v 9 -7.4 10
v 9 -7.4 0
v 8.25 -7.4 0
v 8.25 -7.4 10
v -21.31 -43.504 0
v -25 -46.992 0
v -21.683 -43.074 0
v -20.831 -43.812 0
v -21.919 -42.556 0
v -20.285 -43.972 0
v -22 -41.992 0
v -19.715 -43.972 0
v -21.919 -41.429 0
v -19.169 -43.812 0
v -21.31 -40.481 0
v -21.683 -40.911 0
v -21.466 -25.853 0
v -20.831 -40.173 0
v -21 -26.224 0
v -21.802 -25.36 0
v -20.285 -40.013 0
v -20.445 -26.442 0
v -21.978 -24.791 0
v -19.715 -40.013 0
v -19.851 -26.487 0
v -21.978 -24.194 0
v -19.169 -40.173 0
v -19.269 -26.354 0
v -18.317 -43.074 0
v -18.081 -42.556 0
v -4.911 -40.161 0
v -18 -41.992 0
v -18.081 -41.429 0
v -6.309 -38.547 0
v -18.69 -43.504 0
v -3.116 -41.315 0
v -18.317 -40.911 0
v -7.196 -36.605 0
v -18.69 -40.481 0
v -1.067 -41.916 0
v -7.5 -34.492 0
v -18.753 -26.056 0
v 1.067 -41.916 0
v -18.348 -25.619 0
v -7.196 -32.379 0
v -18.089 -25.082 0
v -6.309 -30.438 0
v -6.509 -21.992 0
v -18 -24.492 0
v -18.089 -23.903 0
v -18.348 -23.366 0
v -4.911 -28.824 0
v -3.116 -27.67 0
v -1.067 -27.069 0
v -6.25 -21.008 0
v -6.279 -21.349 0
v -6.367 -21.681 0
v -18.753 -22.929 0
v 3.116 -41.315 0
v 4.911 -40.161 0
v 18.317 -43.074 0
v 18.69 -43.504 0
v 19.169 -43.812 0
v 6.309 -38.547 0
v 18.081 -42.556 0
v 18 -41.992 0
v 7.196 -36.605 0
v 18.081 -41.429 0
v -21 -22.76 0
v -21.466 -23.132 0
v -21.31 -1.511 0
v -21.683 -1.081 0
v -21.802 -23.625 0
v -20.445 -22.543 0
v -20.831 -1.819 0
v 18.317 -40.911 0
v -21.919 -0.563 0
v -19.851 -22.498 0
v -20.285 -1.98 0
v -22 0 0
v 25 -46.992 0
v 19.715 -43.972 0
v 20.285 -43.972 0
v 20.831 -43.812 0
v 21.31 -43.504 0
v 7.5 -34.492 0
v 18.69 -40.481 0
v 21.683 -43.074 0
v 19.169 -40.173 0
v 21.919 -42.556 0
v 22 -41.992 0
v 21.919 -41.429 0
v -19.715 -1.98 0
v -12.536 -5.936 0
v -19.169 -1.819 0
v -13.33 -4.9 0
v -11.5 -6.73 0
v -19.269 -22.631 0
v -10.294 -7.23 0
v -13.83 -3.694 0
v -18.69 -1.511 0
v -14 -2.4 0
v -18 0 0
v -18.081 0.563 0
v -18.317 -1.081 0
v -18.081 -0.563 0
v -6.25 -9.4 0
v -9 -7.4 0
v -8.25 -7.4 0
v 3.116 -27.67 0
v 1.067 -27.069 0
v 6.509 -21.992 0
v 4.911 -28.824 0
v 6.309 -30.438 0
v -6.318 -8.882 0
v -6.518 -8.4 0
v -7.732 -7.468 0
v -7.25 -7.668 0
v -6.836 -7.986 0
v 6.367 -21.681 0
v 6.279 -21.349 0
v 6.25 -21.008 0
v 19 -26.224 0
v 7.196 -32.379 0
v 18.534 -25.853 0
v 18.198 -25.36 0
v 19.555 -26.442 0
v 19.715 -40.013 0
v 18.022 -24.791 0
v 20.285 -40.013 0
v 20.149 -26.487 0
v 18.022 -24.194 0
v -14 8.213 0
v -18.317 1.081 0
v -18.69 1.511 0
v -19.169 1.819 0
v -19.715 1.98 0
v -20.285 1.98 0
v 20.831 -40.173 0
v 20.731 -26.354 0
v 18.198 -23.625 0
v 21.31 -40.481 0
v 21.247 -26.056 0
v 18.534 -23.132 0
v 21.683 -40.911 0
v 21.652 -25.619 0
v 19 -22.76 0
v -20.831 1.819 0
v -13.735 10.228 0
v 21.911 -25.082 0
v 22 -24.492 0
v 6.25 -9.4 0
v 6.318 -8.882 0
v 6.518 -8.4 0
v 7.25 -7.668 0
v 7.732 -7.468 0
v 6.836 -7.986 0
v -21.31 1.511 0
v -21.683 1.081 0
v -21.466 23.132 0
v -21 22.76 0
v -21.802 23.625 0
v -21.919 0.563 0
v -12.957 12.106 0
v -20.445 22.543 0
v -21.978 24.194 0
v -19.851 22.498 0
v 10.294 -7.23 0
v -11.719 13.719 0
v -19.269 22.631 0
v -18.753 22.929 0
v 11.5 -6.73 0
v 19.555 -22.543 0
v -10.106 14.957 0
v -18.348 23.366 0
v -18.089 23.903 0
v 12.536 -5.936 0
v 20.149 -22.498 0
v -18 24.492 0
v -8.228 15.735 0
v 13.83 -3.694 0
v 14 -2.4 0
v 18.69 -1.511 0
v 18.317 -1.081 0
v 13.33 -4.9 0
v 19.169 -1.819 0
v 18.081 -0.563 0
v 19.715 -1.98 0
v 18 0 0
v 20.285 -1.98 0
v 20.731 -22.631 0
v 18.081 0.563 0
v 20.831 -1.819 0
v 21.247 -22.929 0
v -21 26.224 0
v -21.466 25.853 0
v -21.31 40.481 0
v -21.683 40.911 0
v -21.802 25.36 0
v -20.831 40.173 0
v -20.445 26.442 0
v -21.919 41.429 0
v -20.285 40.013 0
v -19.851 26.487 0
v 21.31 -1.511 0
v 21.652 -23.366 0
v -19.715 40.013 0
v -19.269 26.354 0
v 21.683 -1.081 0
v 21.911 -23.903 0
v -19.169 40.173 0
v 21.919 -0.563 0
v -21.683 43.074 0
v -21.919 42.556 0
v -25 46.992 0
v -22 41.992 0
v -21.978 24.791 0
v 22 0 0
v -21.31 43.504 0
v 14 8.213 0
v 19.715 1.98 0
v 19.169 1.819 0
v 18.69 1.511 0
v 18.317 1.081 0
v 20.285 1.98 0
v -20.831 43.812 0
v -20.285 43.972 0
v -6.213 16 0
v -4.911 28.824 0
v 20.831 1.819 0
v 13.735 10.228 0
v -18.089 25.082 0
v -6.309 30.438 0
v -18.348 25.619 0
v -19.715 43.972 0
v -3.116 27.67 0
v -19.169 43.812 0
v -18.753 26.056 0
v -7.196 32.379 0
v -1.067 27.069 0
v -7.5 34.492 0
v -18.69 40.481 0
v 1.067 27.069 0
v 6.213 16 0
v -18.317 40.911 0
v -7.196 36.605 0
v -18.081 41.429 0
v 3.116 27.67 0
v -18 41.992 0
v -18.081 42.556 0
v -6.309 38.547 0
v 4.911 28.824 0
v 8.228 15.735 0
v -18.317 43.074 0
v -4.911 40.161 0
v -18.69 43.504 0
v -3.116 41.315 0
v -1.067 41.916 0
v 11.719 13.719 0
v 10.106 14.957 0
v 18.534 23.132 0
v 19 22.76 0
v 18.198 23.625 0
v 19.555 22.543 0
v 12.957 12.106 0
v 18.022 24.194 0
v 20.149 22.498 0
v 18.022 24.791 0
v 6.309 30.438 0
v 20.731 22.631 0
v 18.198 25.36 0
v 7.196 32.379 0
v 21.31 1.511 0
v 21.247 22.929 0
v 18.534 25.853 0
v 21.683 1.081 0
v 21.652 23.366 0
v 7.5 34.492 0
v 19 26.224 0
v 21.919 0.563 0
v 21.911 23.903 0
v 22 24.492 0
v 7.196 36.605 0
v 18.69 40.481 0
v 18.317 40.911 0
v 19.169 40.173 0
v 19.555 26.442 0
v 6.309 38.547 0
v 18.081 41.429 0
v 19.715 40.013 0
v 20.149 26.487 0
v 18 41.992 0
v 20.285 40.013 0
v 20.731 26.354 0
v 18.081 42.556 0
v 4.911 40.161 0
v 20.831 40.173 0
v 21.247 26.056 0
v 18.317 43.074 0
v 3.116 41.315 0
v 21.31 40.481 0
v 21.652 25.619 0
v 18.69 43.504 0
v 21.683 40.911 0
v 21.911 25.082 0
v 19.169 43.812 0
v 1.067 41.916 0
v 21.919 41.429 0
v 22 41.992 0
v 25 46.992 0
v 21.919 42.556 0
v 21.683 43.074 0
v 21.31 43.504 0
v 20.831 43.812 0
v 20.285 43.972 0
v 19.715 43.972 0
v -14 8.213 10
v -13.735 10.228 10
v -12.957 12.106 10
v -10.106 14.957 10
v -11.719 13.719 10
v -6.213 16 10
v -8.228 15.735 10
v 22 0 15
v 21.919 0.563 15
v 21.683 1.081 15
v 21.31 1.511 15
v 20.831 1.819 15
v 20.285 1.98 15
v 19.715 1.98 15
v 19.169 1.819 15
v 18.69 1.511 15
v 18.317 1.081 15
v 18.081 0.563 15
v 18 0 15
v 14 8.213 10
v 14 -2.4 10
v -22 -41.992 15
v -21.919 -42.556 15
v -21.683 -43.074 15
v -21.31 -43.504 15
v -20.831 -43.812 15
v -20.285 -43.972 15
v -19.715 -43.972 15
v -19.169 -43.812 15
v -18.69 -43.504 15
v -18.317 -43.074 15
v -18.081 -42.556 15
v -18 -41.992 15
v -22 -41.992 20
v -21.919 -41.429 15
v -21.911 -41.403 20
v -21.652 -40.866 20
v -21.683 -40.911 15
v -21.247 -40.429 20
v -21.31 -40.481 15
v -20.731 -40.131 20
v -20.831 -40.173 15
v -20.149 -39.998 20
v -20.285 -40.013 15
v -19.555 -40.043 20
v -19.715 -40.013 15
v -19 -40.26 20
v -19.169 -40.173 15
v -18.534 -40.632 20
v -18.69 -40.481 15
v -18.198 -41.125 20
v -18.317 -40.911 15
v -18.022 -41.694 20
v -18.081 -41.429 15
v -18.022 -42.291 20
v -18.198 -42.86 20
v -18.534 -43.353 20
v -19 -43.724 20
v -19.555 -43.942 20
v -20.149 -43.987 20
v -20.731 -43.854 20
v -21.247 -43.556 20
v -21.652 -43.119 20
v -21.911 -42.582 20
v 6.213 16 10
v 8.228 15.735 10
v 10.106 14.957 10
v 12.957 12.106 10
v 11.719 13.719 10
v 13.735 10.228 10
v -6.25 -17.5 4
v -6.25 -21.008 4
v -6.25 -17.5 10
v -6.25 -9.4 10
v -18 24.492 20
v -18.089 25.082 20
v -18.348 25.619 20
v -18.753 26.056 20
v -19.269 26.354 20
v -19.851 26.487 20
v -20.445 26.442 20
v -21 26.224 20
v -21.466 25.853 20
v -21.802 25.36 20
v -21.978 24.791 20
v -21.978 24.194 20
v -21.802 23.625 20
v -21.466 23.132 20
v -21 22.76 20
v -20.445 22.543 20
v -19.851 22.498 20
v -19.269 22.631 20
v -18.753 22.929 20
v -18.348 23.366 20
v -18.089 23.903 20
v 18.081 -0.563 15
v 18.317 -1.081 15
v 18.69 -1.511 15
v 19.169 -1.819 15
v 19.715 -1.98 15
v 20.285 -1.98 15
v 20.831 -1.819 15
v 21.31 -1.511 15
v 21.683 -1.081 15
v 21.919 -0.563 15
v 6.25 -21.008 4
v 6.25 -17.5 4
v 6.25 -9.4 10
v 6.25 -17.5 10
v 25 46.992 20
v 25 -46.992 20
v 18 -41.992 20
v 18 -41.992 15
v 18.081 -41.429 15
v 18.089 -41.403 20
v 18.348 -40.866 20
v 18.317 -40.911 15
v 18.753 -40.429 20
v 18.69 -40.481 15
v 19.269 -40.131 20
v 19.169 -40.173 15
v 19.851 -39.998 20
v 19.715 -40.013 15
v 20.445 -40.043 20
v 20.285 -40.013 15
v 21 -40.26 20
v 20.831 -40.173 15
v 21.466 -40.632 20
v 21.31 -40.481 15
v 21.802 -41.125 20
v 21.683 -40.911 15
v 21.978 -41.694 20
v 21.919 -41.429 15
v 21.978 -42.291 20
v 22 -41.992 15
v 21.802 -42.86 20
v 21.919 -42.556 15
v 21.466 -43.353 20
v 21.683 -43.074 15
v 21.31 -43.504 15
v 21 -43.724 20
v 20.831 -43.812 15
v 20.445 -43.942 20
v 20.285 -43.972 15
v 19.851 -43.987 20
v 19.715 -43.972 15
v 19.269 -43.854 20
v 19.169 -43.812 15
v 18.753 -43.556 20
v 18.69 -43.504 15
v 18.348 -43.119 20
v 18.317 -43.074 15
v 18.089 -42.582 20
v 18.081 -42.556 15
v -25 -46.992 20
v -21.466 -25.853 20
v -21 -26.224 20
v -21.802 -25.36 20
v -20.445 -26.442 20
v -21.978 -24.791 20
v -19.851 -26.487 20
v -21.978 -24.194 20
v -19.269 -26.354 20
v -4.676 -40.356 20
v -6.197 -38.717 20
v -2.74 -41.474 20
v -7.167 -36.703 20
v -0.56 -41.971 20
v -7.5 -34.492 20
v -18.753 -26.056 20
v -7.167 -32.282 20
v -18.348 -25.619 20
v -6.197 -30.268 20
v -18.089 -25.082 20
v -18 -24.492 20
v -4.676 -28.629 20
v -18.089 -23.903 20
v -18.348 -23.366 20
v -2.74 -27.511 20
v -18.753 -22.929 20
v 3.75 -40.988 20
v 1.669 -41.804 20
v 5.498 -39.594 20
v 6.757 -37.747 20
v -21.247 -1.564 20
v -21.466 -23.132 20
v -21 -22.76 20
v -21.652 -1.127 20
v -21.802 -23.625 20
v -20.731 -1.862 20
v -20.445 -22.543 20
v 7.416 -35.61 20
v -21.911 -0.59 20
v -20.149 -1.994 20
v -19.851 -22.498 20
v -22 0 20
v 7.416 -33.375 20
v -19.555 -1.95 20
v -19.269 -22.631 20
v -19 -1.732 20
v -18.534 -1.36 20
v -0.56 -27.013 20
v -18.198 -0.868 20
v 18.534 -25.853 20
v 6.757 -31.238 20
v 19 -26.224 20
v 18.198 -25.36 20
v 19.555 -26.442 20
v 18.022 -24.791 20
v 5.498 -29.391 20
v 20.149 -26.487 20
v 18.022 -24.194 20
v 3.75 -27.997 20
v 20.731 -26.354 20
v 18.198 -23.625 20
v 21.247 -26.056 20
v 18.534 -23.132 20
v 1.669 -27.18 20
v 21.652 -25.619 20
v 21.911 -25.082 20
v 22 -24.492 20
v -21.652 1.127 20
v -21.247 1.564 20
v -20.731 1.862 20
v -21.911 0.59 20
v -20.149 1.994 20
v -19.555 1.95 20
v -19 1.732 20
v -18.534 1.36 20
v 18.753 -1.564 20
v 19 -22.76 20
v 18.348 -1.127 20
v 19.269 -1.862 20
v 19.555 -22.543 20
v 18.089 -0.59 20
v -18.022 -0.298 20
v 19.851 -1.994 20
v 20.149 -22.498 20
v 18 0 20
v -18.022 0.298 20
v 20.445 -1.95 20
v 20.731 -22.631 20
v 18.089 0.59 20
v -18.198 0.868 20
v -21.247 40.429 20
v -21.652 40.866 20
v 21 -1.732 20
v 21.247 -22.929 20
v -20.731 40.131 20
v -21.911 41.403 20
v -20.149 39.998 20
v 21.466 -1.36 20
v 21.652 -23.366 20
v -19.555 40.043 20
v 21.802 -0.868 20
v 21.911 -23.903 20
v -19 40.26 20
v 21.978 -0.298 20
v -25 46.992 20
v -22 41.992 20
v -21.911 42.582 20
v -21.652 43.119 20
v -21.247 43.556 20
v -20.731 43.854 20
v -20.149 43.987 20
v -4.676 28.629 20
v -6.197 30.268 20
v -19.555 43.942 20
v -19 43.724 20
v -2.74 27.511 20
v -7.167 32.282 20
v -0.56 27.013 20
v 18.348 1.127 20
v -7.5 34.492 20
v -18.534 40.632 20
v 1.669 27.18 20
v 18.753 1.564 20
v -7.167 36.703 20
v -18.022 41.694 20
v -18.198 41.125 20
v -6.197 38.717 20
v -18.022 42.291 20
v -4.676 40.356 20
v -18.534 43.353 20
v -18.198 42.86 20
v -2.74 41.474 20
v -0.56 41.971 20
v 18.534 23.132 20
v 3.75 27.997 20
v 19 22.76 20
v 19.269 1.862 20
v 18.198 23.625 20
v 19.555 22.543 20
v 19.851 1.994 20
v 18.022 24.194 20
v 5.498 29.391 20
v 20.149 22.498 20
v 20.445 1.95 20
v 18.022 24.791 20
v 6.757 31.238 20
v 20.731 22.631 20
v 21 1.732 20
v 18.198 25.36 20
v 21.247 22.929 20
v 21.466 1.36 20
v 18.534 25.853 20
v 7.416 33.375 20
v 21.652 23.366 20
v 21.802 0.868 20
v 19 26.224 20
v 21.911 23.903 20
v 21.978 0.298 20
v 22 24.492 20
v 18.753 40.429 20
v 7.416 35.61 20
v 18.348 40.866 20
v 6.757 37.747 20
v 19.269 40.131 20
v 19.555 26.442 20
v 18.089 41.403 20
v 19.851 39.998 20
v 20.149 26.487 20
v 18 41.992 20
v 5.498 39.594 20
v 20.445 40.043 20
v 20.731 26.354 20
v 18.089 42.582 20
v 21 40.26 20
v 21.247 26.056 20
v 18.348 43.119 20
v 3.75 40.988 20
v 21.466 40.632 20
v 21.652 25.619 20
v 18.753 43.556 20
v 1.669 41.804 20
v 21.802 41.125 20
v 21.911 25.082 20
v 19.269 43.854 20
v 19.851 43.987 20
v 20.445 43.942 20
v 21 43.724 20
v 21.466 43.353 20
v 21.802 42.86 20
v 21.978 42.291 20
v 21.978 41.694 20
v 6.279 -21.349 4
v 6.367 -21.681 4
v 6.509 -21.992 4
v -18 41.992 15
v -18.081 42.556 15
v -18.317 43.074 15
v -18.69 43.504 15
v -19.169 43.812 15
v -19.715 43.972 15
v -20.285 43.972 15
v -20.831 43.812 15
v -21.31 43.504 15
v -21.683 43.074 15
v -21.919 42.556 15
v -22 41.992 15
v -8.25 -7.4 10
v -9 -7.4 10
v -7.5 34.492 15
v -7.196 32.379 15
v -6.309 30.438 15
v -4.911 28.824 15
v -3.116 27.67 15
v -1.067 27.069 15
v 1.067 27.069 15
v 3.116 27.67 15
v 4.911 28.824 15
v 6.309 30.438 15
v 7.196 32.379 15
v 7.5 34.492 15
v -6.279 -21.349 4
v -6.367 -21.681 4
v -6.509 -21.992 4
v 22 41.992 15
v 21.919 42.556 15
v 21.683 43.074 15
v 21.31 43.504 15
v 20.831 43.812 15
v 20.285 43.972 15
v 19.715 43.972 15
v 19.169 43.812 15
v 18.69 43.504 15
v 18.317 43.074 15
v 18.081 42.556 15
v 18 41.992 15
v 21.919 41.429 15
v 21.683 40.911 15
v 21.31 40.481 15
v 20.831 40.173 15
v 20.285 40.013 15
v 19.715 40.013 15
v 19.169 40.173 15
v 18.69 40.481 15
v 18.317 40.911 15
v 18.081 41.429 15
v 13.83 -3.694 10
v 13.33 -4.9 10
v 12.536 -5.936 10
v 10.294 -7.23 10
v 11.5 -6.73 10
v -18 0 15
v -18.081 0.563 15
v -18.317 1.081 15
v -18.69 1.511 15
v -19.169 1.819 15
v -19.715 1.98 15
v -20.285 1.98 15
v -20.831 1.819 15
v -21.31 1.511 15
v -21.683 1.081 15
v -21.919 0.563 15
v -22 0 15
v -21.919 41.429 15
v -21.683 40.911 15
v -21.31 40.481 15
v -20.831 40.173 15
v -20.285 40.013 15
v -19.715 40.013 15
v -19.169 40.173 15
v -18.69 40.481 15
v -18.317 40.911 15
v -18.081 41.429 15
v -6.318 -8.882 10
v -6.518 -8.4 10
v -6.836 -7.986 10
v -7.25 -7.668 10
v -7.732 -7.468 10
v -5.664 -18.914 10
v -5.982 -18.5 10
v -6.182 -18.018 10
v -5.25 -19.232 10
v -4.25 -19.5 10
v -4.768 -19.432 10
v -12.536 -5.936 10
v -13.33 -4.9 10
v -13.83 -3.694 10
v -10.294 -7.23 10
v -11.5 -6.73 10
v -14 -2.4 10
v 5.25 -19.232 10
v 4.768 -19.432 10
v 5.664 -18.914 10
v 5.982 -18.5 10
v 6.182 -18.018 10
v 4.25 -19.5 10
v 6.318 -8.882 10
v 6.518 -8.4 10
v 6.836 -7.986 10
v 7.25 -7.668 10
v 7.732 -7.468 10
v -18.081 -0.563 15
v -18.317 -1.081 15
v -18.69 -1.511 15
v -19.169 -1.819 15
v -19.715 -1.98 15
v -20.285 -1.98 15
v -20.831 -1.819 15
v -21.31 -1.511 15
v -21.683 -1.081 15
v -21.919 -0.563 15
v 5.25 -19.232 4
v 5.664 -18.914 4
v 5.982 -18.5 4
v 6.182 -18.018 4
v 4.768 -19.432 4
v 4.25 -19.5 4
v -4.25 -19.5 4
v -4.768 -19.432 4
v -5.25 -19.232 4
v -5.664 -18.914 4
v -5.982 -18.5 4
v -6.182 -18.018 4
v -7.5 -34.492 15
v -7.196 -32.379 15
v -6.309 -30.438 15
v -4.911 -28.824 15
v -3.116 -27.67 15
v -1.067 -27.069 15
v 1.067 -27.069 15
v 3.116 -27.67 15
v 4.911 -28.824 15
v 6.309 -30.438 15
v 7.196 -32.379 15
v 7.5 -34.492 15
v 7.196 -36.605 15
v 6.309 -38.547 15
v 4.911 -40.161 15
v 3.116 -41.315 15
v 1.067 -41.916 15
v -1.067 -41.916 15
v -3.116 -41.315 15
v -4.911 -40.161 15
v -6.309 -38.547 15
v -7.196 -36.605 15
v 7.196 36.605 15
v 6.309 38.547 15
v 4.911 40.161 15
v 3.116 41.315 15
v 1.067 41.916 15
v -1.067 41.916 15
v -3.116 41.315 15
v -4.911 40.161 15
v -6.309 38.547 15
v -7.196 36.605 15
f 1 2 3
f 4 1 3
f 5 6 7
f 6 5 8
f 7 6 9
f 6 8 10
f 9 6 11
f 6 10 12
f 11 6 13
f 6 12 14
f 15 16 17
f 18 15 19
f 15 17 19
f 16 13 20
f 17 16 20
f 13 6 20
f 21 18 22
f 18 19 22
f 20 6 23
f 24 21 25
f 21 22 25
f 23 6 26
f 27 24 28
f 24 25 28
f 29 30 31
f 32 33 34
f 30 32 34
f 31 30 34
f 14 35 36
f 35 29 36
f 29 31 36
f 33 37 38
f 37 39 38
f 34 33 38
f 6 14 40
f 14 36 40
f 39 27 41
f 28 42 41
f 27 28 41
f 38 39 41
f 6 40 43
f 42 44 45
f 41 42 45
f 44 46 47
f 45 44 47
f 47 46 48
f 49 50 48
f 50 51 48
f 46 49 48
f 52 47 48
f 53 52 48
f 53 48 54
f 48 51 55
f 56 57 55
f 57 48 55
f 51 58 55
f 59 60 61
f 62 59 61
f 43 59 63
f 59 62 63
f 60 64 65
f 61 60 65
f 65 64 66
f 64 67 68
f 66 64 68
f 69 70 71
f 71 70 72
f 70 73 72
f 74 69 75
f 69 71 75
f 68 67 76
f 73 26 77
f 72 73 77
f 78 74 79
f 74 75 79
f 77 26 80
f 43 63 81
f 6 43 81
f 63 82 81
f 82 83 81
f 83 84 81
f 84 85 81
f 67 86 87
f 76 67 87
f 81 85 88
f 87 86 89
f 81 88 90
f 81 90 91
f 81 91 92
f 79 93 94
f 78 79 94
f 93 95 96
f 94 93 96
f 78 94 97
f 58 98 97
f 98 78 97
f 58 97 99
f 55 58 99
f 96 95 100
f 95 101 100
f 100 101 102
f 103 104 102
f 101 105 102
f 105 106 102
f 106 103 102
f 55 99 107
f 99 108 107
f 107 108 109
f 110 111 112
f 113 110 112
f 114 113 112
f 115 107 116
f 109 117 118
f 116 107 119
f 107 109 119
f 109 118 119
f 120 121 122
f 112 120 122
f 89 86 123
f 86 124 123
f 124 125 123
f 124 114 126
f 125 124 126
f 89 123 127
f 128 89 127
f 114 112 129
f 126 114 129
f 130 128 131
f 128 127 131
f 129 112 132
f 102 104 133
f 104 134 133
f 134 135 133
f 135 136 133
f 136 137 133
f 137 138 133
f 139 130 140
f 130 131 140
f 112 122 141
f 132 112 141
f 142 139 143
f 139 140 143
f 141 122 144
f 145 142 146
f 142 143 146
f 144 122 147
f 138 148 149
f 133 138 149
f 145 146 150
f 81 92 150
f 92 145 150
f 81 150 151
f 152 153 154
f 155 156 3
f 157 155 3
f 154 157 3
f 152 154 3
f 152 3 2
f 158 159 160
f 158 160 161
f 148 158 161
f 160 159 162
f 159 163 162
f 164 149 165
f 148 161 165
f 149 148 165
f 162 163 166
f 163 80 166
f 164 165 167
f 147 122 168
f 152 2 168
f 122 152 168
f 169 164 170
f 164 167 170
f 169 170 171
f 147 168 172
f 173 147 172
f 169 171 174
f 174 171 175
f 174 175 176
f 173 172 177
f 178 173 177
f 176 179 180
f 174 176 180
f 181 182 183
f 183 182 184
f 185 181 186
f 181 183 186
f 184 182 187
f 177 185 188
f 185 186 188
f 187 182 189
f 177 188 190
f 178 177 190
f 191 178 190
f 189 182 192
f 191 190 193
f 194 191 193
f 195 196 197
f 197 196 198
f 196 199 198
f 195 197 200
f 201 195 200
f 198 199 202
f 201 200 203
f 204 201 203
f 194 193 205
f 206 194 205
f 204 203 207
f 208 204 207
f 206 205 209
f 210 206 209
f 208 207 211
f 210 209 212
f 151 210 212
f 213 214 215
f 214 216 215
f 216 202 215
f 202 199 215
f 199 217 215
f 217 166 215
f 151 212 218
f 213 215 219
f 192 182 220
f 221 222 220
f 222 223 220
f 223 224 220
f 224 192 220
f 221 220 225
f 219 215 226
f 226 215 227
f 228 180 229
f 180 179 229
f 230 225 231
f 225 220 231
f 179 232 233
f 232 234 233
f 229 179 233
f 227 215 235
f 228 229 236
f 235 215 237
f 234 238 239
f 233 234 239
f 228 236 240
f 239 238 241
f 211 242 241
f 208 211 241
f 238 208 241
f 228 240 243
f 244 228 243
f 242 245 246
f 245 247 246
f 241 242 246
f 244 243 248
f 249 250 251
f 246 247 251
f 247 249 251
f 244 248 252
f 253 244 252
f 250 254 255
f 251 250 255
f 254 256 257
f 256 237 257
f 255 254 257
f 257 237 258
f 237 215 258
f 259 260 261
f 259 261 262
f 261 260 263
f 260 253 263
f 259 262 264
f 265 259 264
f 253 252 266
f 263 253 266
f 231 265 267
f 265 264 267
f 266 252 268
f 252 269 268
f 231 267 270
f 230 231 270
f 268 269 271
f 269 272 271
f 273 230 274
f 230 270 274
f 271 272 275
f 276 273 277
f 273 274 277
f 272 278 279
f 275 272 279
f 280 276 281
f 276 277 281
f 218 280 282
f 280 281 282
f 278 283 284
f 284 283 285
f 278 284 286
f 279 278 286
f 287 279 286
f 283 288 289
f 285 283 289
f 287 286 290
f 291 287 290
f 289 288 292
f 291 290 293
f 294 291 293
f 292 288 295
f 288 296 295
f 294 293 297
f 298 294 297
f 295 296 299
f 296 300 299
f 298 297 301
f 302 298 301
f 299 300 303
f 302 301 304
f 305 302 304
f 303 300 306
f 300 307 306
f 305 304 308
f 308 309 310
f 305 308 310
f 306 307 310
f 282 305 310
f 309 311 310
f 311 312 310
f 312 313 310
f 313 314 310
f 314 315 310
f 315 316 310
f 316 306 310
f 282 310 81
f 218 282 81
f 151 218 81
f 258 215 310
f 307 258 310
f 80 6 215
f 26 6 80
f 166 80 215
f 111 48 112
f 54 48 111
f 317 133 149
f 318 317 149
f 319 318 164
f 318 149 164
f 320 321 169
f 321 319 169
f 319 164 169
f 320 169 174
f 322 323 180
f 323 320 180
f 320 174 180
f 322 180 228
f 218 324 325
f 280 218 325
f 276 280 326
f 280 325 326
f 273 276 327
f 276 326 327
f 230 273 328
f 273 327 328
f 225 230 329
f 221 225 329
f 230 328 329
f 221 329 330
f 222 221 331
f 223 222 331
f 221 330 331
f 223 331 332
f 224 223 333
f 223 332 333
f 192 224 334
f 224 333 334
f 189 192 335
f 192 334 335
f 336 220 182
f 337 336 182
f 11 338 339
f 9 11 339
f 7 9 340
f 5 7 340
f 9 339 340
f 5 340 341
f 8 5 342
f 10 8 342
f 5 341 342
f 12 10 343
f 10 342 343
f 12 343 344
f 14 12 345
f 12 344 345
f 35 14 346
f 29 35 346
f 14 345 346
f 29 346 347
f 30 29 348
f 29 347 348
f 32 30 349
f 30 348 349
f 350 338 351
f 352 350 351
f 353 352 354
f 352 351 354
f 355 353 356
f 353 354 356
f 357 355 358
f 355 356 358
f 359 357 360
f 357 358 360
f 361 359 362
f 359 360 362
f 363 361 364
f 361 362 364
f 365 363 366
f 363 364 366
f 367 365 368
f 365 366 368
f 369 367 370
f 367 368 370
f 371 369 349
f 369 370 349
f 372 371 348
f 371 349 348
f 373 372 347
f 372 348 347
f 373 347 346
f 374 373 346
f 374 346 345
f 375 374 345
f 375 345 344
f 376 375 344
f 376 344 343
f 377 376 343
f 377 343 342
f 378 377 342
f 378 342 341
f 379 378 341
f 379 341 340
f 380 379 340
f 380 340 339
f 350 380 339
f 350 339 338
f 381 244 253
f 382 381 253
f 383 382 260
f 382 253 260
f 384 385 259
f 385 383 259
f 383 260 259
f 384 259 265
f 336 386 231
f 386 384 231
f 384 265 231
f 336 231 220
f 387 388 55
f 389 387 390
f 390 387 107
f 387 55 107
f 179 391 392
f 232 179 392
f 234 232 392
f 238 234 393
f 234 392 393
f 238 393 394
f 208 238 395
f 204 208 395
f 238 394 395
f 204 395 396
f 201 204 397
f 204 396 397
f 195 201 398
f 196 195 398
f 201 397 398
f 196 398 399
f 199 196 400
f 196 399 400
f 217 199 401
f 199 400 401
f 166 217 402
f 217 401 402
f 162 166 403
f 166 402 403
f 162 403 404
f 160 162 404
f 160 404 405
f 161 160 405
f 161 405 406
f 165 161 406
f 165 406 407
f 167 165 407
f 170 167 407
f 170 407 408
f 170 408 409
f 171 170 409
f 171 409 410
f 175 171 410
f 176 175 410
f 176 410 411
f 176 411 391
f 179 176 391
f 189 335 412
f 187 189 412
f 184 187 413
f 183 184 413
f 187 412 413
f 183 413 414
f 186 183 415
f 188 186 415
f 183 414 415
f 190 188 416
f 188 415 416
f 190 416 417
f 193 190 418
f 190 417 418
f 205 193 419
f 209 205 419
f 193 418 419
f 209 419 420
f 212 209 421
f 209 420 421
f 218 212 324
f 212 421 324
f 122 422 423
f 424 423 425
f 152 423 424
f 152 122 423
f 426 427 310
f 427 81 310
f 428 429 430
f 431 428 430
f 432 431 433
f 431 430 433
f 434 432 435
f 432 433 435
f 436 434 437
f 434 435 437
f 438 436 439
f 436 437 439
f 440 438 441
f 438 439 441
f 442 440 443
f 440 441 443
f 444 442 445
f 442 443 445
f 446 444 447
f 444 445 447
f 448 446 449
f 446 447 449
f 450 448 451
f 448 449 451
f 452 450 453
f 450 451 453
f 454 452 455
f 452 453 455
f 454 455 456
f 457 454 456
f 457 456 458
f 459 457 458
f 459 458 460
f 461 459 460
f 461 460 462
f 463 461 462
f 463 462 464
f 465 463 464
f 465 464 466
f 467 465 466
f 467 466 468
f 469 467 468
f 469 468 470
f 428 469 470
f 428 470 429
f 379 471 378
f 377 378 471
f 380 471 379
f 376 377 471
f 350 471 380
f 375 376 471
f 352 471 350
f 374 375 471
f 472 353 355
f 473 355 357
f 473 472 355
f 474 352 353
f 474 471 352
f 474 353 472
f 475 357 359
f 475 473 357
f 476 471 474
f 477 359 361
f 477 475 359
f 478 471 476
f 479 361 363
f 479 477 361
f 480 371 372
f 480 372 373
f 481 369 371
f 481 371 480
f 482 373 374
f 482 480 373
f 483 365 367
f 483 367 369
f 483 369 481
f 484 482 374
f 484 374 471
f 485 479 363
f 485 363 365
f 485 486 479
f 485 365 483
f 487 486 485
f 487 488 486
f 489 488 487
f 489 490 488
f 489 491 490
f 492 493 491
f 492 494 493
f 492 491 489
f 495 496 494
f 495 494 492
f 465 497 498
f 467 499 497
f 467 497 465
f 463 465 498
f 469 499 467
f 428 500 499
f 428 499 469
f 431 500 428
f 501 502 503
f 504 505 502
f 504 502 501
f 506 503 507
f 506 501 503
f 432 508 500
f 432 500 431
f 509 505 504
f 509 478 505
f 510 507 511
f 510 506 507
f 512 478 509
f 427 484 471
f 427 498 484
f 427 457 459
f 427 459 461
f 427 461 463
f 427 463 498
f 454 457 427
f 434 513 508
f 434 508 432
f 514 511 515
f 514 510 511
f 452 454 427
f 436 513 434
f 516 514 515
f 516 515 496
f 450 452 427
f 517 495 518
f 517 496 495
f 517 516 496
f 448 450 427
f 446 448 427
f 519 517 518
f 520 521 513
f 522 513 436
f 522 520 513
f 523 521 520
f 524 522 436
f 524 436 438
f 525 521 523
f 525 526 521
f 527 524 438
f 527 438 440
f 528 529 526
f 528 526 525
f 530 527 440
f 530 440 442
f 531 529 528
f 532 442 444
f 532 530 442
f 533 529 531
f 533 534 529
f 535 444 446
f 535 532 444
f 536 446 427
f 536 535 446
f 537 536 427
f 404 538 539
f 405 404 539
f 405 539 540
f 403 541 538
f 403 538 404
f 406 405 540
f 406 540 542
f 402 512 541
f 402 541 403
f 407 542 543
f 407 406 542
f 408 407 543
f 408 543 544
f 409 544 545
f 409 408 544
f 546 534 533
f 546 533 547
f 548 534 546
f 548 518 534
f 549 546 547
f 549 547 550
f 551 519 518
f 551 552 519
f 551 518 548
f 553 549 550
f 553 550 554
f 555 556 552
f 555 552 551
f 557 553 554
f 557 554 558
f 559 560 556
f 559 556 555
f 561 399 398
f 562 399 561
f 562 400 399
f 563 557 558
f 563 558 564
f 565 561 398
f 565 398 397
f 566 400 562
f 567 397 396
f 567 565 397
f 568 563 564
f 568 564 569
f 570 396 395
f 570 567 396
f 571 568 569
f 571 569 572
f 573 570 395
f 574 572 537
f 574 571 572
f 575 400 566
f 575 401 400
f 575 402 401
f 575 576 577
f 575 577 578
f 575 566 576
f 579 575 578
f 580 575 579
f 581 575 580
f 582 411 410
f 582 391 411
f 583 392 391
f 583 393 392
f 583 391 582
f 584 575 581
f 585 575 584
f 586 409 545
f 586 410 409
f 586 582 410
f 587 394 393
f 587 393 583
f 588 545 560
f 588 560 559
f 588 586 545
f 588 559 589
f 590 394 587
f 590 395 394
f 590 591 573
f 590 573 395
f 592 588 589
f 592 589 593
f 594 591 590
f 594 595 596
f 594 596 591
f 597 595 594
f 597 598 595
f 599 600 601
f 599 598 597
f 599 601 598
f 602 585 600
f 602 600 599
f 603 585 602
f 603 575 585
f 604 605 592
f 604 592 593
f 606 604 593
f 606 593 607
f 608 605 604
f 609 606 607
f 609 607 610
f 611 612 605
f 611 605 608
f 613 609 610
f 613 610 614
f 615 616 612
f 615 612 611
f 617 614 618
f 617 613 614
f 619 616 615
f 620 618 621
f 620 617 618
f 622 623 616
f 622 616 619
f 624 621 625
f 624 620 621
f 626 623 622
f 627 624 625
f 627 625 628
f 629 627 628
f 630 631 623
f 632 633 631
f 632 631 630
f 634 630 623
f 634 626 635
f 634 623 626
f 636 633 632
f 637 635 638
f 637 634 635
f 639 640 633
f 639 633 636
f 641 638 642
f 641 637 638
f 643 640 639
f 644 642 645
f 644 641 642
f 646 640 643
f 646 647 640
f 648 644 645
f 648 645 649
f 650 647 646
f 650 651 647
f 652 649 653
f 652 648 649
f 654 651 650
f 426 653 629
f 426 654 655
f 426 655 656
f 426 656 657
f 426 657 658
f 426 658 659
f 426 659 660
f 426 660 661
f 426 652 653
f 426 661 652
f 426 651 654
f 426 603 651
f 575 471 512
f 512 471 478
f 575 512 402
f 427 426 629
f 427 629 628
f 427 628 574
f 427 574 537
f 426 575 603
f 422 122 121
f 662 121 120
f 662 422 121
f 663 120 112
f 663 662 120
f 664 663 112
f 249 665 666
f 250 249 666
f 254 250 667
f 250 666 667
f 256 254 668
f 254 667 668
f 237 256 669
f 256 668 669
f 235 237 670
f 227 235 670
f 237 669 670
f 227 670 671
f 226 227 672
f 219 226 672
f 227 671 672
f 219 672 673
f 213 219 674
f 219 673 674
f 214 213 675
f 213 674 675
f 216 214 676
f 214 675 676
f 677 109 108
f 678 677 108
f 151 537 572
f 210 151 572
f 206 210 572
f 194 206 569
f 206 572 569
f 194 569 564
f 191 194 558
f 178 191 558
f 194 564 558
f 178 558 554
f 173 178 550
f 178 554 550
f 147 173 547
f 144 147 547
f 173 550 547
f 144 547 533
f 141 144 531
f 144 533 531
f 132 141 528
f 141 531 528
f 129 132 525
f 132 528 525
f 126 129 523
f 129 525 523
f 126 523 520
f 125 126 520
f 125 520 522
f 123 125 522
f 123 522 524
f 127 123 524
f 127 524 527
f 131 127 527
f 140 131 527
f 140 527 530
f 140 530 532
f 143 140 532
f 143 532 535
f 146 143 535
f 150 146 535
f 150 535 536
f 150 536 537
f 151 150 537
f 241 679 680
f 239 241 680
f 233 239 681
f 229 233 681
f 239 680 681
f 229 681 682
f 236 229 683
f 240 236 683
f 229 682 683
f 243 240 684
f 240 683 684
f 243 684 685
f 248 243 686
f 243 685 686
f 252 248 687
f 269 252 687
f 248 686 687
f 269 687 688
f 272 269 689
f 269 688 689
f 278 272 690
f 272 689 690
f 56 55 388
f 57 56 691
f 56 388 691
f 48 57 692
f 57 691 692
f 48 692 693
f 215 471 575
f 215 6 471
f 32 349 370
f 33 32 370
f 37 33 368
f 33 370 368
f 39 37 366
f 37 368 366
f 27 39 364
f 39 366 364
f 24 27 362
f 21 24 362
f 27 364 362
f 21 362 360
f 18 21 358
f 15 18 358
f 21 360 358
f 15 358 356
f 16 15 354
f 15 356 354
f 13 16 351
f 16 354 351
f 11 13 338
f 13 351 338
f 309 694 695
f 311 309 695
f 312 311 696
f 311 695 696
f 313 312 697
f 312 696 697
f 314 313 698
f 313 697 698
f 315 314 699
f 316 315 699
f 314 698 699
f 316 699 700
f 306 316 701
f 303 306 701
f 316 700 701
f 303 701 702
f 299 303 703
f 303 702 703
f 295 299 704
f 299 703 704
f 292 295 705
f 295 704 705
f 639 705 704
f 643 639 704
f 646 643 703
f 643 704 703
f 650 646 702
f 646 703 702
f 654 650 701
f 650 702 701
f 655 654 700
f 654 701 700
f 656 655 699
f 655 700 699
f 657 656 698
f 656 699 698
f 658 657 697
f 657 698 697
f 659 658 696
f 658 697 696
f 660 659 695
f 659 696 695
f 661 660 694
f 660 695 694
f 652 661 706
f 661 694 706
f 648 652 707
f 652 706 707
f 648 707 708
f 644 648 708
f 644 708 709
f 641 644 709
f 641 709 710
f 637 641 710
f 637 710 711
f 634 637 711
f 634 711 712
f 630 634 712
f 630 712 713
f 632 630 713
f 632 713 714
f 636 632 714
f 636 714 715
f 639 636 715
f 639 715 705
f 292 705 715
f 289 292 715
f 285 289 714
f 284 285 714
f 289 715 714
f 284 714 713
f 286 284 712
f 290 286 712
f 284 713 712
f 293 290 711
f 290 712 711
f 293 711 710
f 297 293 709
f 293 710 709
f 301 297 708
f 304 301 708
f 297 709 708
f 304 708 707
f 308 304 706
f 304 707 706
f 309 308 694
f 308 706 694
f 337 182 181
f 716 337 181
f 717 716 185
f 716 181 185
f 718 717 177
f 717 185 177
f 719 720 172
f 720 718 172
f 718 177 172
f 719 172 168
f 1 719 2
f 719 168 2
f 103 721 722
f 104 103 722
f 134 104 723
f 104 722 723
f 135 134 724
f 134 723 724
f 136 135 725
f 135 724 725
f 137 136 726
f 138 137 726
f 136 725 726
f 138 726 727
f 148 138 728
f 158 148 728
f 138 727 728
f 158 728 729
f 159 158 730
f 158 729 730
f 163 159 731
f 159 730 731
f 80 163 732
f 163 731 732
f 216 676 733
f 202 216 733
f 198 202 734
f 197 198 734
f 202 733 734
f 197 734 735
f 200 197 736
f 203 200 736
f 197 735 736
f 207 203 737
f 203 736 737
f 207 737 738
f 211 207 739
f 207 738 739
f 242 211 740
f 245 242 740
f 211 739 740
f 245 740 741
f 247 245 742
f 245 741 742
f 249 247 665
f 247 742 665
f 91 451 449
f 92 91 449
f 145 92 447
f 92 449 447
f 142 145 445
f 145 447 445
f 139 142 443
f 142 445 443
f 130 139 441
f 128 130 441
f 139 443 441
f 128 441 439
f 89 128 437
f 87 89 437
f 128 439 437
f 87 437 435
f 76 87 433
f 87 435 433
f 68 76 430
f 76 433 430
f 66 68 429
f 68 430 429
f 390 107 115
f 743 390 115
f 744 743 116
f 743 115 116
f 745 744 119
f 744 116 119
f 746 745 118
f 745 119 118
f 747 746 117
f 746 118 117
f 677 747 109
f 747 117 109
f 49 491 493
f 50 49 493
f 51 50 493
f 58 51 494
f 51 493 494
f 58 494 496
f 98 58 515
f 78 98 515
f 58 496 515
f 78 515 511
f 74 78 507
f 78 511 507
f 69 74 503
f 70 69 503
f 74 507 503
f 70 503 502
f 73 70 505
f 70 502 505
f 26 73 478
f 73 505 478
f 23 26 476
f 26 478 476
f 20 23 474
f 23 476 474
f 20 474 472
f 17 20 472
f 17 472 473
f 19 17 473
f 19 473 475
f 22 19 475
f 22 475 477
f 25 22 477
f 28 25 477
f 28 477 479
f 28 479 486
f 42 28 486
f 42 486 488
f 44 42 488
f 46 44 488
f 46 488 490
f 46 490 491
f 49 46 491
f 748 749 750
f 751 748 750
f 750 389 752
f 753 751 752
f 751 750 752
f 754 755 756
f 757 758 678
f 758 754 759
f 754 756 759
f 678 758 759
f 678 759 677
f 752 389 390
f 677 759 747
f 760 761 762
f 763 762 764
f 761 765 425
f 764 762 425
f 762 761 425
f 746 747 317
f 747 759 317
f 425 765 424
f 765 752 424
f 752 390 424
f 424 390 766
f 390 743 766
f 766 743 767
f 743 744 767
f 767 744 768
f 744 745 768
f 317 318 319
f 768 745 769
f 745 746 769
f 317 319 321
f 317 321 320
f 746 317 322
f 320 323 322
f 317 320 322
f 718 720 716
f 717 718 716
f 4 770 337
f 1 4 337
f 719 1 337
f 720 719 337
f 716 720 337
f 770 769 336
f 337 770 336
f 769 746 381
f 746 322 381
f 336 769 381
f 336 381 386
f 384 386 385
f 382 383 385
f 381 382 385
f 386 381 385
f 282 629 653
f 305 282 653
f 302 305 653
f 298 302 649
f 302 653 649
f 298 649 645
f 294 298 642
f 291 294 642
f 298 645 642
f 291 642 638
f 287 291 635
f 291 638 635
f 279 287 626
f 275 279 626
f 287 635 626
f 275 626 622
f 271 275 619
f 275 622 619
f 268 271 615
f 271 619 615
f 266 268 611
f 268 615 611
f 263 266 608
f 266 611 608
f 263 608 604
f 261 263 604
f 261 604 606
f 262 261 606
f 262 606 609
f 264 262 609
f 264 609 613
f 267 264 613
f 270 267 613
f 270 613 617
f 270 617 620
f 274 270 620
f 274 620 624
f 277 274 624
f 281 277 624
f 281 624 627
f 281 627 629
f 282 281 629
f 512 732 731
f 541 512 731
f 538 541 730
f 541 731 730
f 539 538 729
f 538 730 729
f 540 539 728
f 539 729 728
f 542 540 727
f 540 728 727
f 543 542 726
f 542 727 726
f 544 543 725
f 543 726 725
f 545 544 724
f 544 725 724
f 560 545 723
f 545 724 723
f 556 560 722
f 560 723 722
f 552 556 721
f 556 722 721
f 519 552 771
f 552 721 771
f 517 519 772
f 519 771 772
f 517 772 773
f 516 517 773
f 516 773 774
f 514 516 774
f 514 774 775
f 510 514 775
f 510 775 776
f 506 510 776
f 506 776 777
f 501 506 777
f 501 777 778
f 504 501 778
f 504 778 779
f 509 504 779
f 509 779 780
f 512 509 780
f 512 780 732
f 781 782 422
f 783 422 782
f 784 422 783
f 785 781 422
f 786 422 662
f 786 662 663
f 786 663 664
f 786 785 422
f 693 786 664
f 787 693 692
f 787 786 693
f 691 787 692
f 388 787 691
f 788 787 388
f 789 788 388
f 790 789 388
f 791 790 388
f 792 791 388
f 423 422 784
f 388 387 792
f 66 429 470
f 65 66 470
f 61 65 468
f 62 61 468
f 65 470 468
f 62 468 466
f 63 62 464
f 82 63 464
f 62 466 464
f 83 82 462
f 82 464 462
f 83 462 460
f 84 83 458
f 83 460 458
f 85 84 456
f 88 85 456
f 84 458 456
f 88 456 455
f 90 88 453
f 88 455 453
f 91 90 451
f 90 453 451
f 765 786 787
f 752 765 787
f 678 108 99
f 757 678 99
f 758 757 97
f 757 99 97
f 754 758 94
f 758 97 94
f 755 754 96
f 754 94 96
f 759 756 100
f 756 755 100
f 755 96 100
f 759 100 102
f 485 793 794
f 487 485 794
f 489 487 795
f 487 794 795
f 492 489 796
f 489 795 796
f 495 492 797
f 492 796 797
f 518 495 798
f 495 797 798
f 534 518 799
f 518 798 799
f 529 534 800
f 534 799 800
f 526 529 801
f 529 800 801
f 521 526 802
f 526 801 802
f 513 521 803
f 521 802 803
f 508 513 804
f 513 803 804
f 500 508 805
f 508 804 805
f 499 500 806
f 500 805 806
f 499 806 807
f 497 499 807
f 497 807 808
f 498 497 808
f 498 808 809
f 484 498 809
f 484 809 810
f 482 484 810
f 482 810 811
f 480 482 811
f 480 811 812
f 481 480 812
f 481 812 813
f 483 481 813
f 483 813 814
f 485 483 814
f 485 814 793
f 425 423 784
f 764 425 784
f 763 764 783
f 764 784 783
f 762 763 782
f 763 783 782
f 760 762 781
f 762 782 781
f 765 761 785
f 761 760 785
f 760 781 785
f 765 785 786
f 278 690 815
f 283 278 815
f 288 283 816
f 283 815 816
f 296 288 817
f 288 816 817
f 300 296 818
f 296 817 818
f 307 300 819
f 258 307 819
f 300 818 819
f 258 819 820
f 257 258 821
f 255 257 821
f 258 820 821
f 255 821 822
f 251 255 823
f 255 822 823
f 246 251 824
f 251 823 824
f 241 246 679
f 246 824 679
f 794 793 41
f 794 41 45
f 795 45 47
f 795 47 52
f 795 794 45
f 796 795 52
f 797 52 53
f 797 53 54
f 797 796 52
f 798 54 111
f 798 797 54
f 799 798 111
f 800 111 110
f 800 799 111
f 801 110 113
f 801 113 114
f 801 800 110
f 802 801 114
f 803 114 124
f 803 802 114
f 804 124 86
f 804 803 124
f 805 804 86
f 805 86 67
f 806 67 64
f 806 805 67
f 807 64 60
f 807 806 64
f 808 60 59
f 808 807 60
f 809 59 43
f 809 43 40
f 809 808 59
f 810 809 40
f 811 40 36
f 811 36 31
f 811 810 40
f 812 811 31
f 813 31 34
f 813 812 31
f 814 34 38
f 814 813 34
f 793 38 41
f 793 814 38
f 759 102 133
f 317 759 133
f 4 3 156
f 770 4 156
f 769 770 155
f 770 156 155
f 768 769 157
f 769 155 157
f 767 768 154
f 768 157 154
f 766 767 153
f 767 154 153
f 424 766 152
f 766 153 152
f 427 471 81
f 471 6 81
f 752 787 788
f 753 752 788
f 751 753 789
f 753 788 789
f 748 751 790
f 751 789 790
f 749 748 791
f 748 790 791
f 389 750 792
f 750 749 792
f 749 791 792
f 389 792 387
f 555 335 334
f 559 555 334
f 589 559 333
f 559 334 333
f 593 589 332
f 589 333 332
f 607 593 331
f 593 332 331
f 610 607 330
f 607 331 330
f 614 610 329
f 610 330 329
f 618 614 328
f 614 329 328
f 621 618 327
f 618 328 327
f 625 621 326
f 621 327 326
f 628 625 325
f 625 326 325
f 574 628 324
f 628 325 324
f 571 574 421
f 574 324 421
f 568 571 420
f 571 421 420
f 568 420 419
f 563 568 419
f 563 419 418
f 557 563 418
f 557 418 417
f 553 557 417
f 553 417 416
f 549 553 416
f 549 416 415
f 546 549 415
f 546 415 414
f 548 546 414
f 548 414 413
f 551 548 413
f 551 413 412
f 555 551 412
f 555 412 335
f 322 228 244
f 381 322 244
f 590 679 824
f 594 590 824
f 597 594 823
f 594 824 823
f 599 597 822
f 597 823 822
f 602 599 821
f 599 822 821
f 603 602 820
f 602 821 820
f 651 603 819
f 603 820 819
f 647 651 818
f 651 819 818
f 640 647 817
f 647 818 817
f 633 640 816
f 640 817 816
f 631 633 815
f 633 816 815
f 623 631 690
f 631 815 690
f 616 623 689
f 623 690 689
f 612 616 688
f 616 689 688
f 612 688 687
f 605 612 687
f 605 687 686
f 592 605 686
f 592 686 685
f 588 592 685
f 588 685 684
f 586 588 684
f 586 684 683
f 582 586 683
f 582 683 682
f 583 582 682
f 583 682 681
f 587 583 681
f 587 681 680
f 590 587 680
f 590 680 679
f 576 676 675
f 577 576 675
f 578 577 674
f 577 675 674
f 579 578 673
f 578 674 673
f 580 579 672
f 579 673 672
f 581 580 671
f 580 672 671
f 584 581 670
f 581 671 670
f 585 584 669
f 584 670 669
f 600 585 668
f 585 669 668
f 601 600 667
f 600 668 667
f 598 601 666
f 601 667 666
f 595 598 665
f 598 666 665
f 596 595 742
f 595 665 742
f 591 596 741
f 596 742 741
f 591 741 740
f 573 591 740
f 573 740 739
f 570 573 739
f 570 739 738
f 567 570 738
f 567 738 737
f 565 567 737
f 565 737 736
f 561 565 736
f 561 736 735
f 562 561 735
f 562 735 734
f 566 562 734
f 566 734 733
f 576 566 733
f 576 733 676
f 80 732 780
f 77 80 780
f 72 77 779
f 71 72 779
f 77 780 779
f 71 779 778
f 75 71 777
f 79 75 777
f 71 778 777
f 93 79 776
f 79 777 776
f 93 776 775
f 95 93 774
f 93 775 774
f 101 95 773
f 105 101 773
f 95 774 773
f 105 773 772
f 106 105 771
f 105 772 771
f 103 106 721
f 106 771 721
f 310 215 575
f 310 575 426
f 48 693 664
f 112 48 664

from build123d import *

# Parameters (mm, degrees)
BOSS_EXTRUDE1_DEPTH = 15
CUT_EXTRUDE1_DEPTH  = 16
SKETCH3_W           = 50
SKETCH3_H           = 45
BOSS_EXTRUDE3_DEPTH = 15
SKETCH4_W           = 12.5
SKETCH4_H           = 6.523729489
CUT_EXTRUDE2_DEPTH  = 4
FILLET1_R           = 2
SKETCH5_W           = 50
SKETCH5_H           = 25
SKETCH5_R           = 7.5
BOSS_EXTRUDE4_DEPTH = 15
SKETCH6_R           = 2
CUT_EXTRUDE3_DEPTH  = 16
BOSS_EXTRUDE5_DEPTH = 5
SKETCH8_W           = 50
SKETCH8_H           = 93.984880812
BOSS_EXTRUDE6_DEPTH = 5
SKETCH9_R           = 2
SKETCH9_R_2         = 7.5
CUT_EXTRUDE4_DEPTH  = 21
SKETCH10_R          = 2
CUT_EXTRUDE5_DEPTH  = 21


with BuildPart() as part:
    # Sketch1 → Boss-Extrude1 (new body)
    with BuildSketch(Plane.XY):
        with BuildLine():
            Line((-7, 19), (7, 19))
            ThreePointArc((7, 19), (14.071067812, 16.071067812), (17, 9))
            Line((17, 9), (17, -5))
            ThreePointArc((17, -5), (14.071067812, -12.071067812), (7, -15))
            Line((7, -15), (-7, -15))
            ThreePointArc((-7, -15), (-14.071067812, -12.071067812), (-17, -5))
            Line((-17, -5), (-17, 9))
            ThreePointArc((-17, 9), (-14.071067812, 16.071067812), (-7, 19))
        make_face()
    extrude(amount=BOSS_EXTRUDE1_DEPTH)

    # Sketch2 → Cut-Extrude1 (cut, through all)
    with BuildSketch(Plane(origin=(0, 0, 0), x_dir=(-1, 0, 0), z_dir=(0, 0, -1))):
        with BuildLine():
            Line((14, 0.39), (14, 8.212908396))
            ThreePointArc((14, 8.212908396), (11.719213675, 13.719213675), (6.212908396, 16))
            Line((6.212908396, 16), (-6.212908396, 16))
            ThreePointArc((-6.212908396, 16), (-11.719213675, 13.719213675), (-14, 8.212908396))
            Line((-14, 8.212908396), (-14, 0.39))
            Line((-14, 0.39), (-14, -2.4))
            ThreePointArc((-14, -2.4), (-12.535533906, -5.935533906), (-9, -7.4))
            Line((-9, -7.4), (-8.25, -7.4))
            ThreePointArc((-8.25, -7.4), (-6.835786438, -7.985786438), (-6.25, -9.4))
            Line((-6.25, -9.4), (-6.25, -17.62539529))
            Line((-6.25, -17.62539529), (6.25, -17.62539529))
            Line((6.25, -17.62539529), (6.25, -9.4))
            ThreePointArc((6.25, -9.4), (6.835786438, -7.985786438), (8.25, -7.4))
            Line((8.25, -7.4), (9, -7.4))
            ThreePointArc((9, -7.4), (12.535533906, -5.935533906), (14, -2.4))
            Line((14, -2.4), (14, 0.39))
        make_face()
    extrude(amount=-CUT_EXTRUDE1_DEPTH, mode=Mode.SUBTRACT)

    # Sketch3 → Boss-Extrude3 (add)
    with BuildSketch(Plane(origin=(0, 0, 0), x_dir=(-1, 0, 0), z_dir=(0, 0, -1))):
        with Locations((0, -0.507559594)):
            Rectangle(SKETCH3_W, SKETCH3_H)
        with BuildLine():
            Line((-6.25, -9.4), (-6.25, -15))
            Line((-6.25, -15), (-6.25, -17.5))
            ThreePointArc((-6.25, -17.5), (-5.664213562, -18.914213562), (-4.25, -19.5))
            Line((-4.25, -19.5), (4.25, -19.5))
            ThreePointArc((4.25, -19.5), (5.664213562, -18.914213562), (6.25, -17.5))
            Line((6.25, -17.5), (6.25, -15))
            Line((6.25, -15), (6.25, -9.4))
            ThreePointArc((6.25, -9.4), (6.835786438, -7.985786438), (8.25, -7.4))
            Line((8.25, -7.4), (9, -7.4))
            ThreePointArc((9, -7.4), (12.535533906, -5.935533906), (14, -2.4))
            Line((14, -2.4), (14, 8.212908396))
            ThreePointArc((14, 8.212908396), (11.719213675, 13.719213675), (6.212908396, 16))
            Line((6.212908396, 16), (-6.212908396, 16))
            ThreePointArc((-6.212908396, 16), (-11.719213675, 13.719213675), (-14, 8.212908396))
            Line((-14, 8.212908396), (-14, -2.4))
            ThreePointArc((-14, -2.4), (-12.535533906, -5.935533906), (-9, -7.4))
            Line((-9, -7.4), (-8.25, -7.4))
            ThreePointArc((-8.25, -7.4), (-6.835786438, -7.985786438), (-6.25, -9.4))
        make_face(mode=Mode.SUBTRACT)
    extrude(amount=-BOSS_EXTRUDE3_DEPTH)

    # Sketch4 → Cut-Extrude2 (cut)
    with BuildSketch(Plane(origin=(0, 0, 0), x_dir=(-1, 0, 0), z_dir=(0, 0, -1))):
        with Locations((0, -19.74569485)):
            Rectangle(SKETCH4_W, SKETCH4_H)
    extrude(amount=-CUT_EXTRUDE2_DEPTH, mode=Mode.SUBTRACT)

    # Fillet1
    fillet1_edges = [part.edges().sort_by_distance(p)[0] for p in [
        (6.25, -23.007559594, 2),
        (-6.25, -23.007559594, 2),
    ]]
    fillet(fillet1_edges, radius=FILLET1_R)

    # Sketch5 → Boss-Extrude4 (add)
    with BuildSketch(Plane.XY.offset(15)):
        with Locations((0, 34.492440406)):
            Rectangle(SKETCH5_W, SKETCH5_H)
        with Locations((0, 34.492440406)):
            Circle(SKETCH5_R, mode=Mode.SUBTRACT)
    boss_extrude4 = extrude(amount=-BOSS_EXTRUDE4_DEPTH)

    # Mirror1: Boss-Extrude4 across plane
    add(boss_extrude4.mirror(Plane.ZX))

    # Sketch6 → Cut-Extrude3 (cut, through all)
    with BuildSketch(Plane.XY.offset(15)):
        with Locations((-20, 41.992440406)):
            Circle(SKETCH6_R)
        with Locations((20, 41.992440406)):
            Circle(SKETCH6_R)
        with Locations((20, -41.992440406)):
            Circle(SKETCH6_R)
        with Locations((-20, -41.992440406)):
            Circle(SKETCH6_R)
        with Locations((20, 0)):
            Circle(SKETCH6_R)
        with Locations((-20, 0)):
            Circle(SKETCH6_R)
    extrude(amount=-CUT_EXTRUDE3_DEPTH, mode=Mode.SUBTRACT)

    # Sketch7 → Boss-Extrude5 (add)
    with BuildSketch(Plane.XY.offset(15)):
        with BuildLine():
            Line((-4.25, -19.5), (4.25, -19.5))
            ThreePointArc((4.25, -19.5), (5.664213562, -18.914213562), (6.25, -17.5))
            Line((6.25, -17.5), (6.25, -9.4))
            ThreePointArc((6.25, -9.4), (6.835786438, -7.985786438), (8.25, -7.4))
            Line((8.25, -7.4), (9, -7.4))
            ThreePointArc((9, -7.4), (12.535533906, -5.935533906), (14, -2.4))
            Line((14, -2.4), (14, 8.212908396))
            ThreePointArc((14, 8.212908396), (11.719213675, 13.719213675), (6.212908396, 16))
            Line((6.212908396, 16), (-6.212908396, 16))
            ThreePointArc((-6.212908396, 16), (-11.719213675, 13.719213675), (-14, 8.212908396))
            Line((-14, 8.212908396), (-14, -2.4))
            ThreePointArc((-14, -2.4), (-12.535533906, -5.935533906), (-9, -7.4))
            Line((-9, -7.4), (-8.25, -7.4))
            ThreePointArc((-8.25, -7.4), (-6.835786438, -7.985786438), (-6.25, -9.4))
            Line((-6.25, -9.4), (-6.25, -17.5))
            ThreePointArc((-6.25, -17.5), (-5.664213562, -18.914213562), (-4.25, -19.5))
        make_face()
    extrude(amount=-BOSS_EXTRUDE5_DEPTH)

    # Sketch8 → Boss-Extrude6 (add)
    with BuildSketch(Plane.XY.offset(15)):
        Rectangle(SKETCH8_W, SKETCH8_H)
    extrude(amount=BOSS_EXTRUDE6_DEPTH)

    # Sketch9 → Cut-Extrude4 (cut, through all)
    with BuildSketch(Plane(origin=(0, 0, 0), x_dir=(-1, 0, 0), z_dir=(0, 0, -1))):
        with Locations((20, -41.992440406)):
            Circle(SKETCH9_R)
        with Locations((0, -34.492440406)):
            Circle(SKETCH9_R_2)
        with Locations((-20, -41.992440406)):
            Circle(SKETCH9_R)
        with Locations((20, 0)):
            Circle(SKETCH9_R)
        with Locations((-20, 0)):
            Circle(SKETCH9_R)
        with Locations((-20, 41.992440406)):
            Circle(SKETCH9_R)
        with Locations((0, 34.492440406)):
            Circle(SKETCH9_R_2)
        with Locations((20, 41.992440406)):
            Circle(SKETCH9_R)
    extrude(amount=-CUT_EXTRUDE4_DEPTH, mode=Mode.SUBTRACT)

    # Sketch10 → Cut-Extrude5 (cut, through all)
    with BuildSketch(Plane.XY.offset(20)):
        with Locations((-20, 24.492440406)):
            Circle(SKETCH10_R)
        with Locations((20, 24.492440406)):
            Circle(SKETCH10_R)
        with Locations((20, -24.492440406)):
            Circle(SKETCH10_R)
        with Locations((-20, -24.492440406)):
            Circle(SKETCH10_R)
    extrude(amount=-CUT_EXTRUDE5_DEPTH, mode=Mode.SUBTRACT)


solid = part.part
